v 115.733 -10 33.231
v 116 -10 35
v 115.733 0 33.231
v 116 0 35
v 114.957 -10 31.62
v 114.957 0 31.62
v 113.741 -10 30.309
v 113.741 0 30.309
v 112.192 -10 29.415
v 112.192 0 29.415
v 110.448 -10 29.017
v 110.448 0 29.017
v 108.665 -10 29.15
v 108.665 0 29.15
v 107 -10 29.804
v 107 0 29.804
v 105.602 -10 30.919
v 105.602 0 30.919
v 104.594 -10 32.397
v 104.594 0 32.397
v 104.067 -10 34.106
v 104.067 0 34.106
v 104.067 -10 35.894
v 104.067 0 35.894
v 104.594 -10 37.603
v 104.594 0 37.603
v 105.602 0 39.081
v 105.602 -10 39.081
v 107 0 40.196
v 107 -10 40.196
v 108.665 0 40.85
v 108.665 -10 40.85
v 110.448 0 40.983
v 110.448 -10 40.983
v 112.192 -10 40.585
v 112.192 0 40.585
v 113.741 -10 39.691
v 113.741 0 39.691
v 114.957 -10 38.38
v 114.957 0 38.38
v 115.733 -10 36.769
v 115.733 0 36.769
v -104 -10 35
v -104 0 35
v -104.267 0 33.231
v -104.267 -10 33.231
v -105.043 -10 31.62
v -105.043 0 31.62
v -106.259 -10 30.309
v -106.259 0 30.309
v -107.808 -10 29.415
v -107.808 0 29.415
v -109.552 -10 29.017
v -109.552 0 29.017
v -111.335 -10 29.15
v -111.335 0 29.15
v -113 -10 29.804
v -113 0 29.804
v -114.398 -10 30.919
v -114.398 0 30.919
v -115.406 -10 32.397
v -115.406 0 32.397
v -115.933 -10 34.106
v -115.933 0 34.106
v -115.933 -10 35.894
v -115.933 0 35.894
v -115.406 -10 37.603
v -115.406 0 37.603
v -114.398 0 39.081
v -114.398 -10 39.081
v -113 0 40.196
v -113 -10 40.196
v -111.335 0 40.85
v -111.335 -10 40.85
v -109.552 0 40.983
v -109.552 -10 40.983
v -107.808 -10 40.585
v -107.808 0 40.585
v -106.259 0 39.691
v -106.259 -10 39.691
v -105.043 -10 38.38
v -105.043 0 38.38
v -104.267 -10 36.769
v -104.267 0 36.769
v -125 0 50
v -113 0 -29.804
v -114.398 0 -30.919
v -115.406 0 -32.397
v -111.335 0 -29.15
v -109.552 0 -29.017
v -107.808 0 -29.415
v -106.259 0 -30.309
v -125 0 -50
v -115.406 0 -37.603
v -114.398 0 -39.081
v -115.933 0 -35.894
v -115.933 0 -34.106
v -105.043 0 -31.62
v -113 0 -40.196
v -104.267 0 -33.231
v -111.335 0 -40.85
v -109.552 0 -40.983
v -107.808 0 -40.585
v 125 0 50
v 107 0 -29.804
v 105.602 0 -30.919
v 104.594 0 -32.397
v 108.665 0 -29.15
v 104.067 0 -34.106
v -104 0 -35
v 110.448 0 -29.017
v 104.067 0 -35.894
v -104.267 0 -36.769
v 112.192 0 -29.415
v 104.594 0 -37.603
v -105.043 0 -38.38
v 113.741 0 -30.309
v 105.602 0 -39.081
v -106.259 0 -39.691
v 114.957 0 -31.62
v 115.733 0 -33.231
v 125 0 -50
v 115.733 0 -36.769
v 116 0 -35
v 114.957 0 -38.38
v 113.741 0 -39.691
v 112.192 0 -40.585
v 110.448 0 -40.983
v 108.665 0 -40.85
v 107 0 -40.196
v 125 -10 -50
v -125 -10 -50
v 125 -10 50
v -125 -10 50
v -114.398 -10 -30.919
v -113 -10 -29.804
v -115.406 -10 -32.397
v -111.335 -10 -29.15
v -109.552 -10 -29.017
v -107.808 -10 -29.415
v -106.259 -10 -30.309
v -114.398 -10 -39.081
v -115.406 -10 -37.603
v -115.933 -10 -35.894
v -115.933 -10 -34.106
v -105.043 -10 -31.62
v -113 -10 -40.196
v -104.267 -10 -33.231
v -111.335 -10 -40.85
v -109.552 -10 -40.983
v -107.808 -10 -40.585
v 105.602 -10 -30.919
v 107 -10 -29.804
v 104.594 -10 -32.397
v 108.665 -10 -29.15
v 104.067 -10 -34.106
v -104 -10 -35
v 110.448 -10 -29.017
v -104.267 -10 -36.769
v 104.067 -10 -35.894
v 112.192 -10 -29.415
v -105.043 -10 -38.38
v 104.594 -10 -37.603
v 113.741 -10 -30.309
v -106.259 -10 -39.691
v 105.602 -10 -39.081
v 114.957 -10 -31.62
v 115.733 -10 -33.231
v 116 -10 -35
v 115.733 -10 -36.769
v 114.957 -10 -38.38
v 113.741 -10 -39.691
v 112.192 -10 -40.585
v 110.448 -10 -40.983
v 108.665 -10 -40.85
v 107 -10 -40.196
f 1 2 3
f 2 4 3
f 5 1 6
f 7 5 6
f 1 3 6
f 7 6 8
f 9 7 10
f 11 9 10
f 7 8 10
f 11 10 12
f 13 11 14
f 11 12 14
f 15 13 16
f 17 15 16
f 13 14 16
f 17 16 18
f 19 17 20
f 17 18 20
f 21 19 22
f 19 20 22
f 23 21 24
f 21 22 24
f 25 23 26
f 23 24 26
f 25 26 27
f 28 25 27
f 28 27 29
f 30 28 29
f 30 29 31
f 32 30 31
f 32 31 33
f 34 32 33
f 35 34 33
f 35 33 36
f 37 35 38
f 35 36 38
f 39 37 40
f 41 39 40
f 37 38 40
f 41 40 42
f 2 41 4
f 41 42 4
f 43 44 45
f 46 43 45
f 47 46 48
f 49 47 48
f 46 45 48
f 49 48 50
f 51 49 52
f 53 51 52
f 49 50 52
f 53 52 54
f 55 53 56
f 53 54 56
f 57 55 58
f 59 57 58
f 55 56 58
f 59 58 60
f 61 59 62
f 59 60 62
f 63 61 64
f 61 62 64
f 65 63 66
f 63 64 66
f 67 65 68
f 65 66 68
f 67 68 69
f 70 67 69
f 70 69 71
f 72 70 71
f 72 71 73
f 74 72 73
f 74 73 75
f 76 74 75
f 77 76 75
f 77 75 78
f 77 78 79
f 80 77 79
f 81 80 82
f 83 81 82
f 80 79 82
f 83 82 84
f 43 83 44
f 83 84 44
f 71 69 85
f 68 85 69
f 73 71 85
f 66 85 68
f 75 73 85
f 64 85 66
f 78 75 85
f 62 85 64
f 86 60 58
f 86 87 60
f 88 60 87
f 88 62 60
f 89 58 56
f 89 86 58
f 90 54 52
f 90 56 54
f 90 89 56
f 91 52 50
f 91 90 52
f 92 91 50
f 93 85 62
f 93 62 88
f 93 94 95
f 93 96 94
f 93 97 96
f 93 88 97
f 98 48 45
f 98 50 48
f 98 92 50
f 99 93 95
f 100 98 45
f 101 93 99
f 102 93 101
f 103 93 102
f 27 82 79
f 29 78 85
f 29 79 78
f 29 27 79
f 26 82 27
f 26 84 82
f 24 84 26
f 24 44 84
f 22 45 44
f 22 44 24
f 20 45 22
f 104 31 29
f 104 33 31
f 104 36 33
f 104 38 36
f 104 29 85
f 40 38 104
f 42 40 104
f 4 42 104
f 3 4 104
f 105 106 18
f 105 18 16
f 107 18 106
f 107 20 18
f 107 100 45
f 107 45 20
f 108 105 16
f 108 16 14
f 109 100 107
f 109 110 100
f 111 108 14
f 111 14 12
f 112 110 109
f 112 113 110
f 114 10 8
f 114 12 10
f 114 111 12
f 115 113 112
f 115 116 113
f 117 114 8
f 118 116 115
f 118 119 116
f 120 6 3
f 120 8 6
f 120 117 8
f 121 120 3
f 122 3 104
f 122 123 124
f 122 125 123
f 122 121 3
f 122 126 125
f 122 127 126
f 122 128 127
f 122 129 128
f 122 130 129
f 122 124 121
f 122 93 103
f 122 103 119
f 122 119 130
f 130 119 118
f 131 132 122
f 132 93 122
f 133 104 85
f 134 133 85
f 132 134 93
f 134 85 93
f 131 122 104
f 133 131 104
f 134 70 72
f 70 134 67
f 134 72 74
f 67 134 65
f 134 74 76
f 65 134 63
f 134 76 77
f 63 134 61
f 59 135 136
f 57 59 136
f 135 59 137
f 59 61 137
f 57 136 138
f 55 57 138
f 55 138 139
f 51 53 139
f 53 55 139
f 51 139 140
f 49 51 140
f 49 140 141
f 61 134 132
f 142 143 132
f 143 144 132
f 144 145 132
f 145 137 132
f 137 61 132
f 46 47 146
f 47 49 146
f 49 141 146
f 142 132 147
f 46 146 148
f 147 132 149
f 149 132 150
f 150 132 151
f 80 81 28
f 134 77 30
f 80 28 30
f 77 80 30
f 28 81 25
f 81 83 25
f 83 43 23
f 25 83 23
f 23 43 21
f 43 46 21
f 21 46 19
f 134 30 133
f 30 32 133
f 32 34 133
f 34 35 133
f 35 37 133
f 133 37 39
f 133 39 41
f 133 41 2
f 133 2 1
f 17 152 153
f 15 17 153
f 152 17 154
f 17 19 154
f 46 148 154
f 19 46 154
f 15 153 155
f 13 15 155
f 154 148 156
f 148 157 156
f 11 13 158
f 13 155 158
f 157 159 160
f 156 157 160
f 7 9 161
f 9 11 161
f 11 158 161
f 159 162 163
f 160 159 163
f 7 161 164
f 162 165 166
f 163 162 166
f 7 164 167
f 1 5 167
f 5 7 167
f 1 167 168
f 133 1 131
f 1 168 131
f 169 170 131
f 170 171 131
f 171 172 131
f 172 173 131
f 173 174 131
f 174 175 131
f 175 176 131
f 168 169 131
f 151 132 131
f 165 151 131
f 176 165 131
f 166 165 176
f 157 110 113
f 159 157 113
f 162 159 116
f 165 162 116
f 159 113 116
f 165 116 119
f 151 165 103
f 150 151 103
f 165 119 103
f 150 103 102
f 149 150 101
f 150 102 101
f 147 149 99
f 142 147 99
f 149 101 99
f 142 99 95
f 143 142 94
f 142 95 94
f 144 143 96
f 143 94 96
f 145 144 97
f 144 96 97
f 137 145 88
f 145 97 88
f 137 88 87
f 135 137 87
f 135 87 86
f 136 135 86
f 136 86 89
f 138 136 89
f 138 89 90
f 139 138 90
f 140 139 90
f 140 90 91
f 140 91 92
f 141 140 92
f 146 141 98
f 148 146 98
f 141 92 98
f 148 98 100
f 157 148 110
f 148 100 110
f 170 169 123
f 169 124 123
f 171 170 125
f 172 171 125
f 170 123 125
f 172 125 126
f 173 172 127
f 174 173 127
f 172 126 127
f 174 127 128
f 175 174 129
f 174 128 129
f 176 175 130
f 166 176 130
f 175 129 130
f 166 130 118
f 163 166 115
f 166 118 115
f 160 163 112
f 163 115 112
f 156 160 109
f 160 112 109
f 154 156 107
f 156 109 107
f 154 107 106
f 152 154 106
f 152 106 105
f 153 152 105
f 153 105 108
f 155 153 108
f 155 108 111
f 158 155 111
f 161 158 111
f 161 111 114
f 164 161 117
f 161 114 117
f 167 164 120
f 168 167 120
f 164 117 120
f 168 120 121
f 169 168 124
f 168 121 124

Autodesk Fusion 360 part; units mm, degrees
sketch "Sketch1" plane through (0, 0, 0) normal (0, 1, 0) x (1, 0, 0) in component "Base Plate"
  line L0 (-125, 50) -> (125, 50)
  line L1 (125, 50) -> (125, -50)
  line L2 (125, -50) -> (-125, -50)
  line L3 (-125, -50) -> (-125, 50)
  line L4 (-125, 50) -> (125, -50) construction
  line L5 (125, 50) -> (-125, -50) construction
  circle A0 centre (-110, 35) radius 6
  circle A1 centre (-110, -35) radius 6
  line L6 (0, 0) -> (0, 50) construction
  circle A2 centre (110, 35) radius 6
  circle A3 centre (110, -35) radius 6
  dimension "d1" = 100
  dimension "d2" = 250
  dimension "d3" = 15
  dimension "d4" = 15
  dimension "d5" = 12
  dimension "d6" = 15
extrude "Extrude1" add sketch "Sketch1" against normal blind 10 in component "Base Plate"
component "Base Plate" placed x (1, 0, 0) y (0, 1, 0) z (0, 0, 1) at (0, 0, 0)
